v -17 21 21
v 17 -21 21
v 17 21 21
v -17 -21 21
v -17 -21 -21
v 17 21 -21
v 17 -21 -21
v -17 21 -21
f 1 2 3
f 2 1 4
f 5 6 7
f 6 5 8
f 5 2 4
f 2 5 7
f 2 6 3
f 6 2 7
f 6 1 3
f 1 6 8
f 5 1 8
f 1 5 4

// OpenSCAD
////////////////////////////////
// Define constant parameters //
////////////////////////////////


// all length units are in millimetes

// motor is a astrosym 17PM stepper motor
motor_length = 034;
motor_width = 42;
motor_height = 42;




module base_plane(){
	circle(100);
}



module motor_attachment(){
    cube(size = [motor_length, motor_width, motor_height], center = true);
}

module example001()
{
	function r_from_dia(d) = d / 2;

	module rotcy(rot, r, h) {
		rotate(90, rot)
			cylinder(r = r, h = h, center = true);
	}

	difference() {
		sphere(r = r_from_dia(size));
		rotcy([0, 0, 0], cy_r, cy_h);
		rotcy([1, 0, 0], cy_r, cy_h);
		rotcy([0, 1, 0], cy_r, cy_h);
	}

	size = 50;
	hole = 25;

	cy_r = r_from_dia(hole);
	cy_h = r_from_dia(size * 2.5);
}

// example001();
// base_plane();
motor_attachment();
